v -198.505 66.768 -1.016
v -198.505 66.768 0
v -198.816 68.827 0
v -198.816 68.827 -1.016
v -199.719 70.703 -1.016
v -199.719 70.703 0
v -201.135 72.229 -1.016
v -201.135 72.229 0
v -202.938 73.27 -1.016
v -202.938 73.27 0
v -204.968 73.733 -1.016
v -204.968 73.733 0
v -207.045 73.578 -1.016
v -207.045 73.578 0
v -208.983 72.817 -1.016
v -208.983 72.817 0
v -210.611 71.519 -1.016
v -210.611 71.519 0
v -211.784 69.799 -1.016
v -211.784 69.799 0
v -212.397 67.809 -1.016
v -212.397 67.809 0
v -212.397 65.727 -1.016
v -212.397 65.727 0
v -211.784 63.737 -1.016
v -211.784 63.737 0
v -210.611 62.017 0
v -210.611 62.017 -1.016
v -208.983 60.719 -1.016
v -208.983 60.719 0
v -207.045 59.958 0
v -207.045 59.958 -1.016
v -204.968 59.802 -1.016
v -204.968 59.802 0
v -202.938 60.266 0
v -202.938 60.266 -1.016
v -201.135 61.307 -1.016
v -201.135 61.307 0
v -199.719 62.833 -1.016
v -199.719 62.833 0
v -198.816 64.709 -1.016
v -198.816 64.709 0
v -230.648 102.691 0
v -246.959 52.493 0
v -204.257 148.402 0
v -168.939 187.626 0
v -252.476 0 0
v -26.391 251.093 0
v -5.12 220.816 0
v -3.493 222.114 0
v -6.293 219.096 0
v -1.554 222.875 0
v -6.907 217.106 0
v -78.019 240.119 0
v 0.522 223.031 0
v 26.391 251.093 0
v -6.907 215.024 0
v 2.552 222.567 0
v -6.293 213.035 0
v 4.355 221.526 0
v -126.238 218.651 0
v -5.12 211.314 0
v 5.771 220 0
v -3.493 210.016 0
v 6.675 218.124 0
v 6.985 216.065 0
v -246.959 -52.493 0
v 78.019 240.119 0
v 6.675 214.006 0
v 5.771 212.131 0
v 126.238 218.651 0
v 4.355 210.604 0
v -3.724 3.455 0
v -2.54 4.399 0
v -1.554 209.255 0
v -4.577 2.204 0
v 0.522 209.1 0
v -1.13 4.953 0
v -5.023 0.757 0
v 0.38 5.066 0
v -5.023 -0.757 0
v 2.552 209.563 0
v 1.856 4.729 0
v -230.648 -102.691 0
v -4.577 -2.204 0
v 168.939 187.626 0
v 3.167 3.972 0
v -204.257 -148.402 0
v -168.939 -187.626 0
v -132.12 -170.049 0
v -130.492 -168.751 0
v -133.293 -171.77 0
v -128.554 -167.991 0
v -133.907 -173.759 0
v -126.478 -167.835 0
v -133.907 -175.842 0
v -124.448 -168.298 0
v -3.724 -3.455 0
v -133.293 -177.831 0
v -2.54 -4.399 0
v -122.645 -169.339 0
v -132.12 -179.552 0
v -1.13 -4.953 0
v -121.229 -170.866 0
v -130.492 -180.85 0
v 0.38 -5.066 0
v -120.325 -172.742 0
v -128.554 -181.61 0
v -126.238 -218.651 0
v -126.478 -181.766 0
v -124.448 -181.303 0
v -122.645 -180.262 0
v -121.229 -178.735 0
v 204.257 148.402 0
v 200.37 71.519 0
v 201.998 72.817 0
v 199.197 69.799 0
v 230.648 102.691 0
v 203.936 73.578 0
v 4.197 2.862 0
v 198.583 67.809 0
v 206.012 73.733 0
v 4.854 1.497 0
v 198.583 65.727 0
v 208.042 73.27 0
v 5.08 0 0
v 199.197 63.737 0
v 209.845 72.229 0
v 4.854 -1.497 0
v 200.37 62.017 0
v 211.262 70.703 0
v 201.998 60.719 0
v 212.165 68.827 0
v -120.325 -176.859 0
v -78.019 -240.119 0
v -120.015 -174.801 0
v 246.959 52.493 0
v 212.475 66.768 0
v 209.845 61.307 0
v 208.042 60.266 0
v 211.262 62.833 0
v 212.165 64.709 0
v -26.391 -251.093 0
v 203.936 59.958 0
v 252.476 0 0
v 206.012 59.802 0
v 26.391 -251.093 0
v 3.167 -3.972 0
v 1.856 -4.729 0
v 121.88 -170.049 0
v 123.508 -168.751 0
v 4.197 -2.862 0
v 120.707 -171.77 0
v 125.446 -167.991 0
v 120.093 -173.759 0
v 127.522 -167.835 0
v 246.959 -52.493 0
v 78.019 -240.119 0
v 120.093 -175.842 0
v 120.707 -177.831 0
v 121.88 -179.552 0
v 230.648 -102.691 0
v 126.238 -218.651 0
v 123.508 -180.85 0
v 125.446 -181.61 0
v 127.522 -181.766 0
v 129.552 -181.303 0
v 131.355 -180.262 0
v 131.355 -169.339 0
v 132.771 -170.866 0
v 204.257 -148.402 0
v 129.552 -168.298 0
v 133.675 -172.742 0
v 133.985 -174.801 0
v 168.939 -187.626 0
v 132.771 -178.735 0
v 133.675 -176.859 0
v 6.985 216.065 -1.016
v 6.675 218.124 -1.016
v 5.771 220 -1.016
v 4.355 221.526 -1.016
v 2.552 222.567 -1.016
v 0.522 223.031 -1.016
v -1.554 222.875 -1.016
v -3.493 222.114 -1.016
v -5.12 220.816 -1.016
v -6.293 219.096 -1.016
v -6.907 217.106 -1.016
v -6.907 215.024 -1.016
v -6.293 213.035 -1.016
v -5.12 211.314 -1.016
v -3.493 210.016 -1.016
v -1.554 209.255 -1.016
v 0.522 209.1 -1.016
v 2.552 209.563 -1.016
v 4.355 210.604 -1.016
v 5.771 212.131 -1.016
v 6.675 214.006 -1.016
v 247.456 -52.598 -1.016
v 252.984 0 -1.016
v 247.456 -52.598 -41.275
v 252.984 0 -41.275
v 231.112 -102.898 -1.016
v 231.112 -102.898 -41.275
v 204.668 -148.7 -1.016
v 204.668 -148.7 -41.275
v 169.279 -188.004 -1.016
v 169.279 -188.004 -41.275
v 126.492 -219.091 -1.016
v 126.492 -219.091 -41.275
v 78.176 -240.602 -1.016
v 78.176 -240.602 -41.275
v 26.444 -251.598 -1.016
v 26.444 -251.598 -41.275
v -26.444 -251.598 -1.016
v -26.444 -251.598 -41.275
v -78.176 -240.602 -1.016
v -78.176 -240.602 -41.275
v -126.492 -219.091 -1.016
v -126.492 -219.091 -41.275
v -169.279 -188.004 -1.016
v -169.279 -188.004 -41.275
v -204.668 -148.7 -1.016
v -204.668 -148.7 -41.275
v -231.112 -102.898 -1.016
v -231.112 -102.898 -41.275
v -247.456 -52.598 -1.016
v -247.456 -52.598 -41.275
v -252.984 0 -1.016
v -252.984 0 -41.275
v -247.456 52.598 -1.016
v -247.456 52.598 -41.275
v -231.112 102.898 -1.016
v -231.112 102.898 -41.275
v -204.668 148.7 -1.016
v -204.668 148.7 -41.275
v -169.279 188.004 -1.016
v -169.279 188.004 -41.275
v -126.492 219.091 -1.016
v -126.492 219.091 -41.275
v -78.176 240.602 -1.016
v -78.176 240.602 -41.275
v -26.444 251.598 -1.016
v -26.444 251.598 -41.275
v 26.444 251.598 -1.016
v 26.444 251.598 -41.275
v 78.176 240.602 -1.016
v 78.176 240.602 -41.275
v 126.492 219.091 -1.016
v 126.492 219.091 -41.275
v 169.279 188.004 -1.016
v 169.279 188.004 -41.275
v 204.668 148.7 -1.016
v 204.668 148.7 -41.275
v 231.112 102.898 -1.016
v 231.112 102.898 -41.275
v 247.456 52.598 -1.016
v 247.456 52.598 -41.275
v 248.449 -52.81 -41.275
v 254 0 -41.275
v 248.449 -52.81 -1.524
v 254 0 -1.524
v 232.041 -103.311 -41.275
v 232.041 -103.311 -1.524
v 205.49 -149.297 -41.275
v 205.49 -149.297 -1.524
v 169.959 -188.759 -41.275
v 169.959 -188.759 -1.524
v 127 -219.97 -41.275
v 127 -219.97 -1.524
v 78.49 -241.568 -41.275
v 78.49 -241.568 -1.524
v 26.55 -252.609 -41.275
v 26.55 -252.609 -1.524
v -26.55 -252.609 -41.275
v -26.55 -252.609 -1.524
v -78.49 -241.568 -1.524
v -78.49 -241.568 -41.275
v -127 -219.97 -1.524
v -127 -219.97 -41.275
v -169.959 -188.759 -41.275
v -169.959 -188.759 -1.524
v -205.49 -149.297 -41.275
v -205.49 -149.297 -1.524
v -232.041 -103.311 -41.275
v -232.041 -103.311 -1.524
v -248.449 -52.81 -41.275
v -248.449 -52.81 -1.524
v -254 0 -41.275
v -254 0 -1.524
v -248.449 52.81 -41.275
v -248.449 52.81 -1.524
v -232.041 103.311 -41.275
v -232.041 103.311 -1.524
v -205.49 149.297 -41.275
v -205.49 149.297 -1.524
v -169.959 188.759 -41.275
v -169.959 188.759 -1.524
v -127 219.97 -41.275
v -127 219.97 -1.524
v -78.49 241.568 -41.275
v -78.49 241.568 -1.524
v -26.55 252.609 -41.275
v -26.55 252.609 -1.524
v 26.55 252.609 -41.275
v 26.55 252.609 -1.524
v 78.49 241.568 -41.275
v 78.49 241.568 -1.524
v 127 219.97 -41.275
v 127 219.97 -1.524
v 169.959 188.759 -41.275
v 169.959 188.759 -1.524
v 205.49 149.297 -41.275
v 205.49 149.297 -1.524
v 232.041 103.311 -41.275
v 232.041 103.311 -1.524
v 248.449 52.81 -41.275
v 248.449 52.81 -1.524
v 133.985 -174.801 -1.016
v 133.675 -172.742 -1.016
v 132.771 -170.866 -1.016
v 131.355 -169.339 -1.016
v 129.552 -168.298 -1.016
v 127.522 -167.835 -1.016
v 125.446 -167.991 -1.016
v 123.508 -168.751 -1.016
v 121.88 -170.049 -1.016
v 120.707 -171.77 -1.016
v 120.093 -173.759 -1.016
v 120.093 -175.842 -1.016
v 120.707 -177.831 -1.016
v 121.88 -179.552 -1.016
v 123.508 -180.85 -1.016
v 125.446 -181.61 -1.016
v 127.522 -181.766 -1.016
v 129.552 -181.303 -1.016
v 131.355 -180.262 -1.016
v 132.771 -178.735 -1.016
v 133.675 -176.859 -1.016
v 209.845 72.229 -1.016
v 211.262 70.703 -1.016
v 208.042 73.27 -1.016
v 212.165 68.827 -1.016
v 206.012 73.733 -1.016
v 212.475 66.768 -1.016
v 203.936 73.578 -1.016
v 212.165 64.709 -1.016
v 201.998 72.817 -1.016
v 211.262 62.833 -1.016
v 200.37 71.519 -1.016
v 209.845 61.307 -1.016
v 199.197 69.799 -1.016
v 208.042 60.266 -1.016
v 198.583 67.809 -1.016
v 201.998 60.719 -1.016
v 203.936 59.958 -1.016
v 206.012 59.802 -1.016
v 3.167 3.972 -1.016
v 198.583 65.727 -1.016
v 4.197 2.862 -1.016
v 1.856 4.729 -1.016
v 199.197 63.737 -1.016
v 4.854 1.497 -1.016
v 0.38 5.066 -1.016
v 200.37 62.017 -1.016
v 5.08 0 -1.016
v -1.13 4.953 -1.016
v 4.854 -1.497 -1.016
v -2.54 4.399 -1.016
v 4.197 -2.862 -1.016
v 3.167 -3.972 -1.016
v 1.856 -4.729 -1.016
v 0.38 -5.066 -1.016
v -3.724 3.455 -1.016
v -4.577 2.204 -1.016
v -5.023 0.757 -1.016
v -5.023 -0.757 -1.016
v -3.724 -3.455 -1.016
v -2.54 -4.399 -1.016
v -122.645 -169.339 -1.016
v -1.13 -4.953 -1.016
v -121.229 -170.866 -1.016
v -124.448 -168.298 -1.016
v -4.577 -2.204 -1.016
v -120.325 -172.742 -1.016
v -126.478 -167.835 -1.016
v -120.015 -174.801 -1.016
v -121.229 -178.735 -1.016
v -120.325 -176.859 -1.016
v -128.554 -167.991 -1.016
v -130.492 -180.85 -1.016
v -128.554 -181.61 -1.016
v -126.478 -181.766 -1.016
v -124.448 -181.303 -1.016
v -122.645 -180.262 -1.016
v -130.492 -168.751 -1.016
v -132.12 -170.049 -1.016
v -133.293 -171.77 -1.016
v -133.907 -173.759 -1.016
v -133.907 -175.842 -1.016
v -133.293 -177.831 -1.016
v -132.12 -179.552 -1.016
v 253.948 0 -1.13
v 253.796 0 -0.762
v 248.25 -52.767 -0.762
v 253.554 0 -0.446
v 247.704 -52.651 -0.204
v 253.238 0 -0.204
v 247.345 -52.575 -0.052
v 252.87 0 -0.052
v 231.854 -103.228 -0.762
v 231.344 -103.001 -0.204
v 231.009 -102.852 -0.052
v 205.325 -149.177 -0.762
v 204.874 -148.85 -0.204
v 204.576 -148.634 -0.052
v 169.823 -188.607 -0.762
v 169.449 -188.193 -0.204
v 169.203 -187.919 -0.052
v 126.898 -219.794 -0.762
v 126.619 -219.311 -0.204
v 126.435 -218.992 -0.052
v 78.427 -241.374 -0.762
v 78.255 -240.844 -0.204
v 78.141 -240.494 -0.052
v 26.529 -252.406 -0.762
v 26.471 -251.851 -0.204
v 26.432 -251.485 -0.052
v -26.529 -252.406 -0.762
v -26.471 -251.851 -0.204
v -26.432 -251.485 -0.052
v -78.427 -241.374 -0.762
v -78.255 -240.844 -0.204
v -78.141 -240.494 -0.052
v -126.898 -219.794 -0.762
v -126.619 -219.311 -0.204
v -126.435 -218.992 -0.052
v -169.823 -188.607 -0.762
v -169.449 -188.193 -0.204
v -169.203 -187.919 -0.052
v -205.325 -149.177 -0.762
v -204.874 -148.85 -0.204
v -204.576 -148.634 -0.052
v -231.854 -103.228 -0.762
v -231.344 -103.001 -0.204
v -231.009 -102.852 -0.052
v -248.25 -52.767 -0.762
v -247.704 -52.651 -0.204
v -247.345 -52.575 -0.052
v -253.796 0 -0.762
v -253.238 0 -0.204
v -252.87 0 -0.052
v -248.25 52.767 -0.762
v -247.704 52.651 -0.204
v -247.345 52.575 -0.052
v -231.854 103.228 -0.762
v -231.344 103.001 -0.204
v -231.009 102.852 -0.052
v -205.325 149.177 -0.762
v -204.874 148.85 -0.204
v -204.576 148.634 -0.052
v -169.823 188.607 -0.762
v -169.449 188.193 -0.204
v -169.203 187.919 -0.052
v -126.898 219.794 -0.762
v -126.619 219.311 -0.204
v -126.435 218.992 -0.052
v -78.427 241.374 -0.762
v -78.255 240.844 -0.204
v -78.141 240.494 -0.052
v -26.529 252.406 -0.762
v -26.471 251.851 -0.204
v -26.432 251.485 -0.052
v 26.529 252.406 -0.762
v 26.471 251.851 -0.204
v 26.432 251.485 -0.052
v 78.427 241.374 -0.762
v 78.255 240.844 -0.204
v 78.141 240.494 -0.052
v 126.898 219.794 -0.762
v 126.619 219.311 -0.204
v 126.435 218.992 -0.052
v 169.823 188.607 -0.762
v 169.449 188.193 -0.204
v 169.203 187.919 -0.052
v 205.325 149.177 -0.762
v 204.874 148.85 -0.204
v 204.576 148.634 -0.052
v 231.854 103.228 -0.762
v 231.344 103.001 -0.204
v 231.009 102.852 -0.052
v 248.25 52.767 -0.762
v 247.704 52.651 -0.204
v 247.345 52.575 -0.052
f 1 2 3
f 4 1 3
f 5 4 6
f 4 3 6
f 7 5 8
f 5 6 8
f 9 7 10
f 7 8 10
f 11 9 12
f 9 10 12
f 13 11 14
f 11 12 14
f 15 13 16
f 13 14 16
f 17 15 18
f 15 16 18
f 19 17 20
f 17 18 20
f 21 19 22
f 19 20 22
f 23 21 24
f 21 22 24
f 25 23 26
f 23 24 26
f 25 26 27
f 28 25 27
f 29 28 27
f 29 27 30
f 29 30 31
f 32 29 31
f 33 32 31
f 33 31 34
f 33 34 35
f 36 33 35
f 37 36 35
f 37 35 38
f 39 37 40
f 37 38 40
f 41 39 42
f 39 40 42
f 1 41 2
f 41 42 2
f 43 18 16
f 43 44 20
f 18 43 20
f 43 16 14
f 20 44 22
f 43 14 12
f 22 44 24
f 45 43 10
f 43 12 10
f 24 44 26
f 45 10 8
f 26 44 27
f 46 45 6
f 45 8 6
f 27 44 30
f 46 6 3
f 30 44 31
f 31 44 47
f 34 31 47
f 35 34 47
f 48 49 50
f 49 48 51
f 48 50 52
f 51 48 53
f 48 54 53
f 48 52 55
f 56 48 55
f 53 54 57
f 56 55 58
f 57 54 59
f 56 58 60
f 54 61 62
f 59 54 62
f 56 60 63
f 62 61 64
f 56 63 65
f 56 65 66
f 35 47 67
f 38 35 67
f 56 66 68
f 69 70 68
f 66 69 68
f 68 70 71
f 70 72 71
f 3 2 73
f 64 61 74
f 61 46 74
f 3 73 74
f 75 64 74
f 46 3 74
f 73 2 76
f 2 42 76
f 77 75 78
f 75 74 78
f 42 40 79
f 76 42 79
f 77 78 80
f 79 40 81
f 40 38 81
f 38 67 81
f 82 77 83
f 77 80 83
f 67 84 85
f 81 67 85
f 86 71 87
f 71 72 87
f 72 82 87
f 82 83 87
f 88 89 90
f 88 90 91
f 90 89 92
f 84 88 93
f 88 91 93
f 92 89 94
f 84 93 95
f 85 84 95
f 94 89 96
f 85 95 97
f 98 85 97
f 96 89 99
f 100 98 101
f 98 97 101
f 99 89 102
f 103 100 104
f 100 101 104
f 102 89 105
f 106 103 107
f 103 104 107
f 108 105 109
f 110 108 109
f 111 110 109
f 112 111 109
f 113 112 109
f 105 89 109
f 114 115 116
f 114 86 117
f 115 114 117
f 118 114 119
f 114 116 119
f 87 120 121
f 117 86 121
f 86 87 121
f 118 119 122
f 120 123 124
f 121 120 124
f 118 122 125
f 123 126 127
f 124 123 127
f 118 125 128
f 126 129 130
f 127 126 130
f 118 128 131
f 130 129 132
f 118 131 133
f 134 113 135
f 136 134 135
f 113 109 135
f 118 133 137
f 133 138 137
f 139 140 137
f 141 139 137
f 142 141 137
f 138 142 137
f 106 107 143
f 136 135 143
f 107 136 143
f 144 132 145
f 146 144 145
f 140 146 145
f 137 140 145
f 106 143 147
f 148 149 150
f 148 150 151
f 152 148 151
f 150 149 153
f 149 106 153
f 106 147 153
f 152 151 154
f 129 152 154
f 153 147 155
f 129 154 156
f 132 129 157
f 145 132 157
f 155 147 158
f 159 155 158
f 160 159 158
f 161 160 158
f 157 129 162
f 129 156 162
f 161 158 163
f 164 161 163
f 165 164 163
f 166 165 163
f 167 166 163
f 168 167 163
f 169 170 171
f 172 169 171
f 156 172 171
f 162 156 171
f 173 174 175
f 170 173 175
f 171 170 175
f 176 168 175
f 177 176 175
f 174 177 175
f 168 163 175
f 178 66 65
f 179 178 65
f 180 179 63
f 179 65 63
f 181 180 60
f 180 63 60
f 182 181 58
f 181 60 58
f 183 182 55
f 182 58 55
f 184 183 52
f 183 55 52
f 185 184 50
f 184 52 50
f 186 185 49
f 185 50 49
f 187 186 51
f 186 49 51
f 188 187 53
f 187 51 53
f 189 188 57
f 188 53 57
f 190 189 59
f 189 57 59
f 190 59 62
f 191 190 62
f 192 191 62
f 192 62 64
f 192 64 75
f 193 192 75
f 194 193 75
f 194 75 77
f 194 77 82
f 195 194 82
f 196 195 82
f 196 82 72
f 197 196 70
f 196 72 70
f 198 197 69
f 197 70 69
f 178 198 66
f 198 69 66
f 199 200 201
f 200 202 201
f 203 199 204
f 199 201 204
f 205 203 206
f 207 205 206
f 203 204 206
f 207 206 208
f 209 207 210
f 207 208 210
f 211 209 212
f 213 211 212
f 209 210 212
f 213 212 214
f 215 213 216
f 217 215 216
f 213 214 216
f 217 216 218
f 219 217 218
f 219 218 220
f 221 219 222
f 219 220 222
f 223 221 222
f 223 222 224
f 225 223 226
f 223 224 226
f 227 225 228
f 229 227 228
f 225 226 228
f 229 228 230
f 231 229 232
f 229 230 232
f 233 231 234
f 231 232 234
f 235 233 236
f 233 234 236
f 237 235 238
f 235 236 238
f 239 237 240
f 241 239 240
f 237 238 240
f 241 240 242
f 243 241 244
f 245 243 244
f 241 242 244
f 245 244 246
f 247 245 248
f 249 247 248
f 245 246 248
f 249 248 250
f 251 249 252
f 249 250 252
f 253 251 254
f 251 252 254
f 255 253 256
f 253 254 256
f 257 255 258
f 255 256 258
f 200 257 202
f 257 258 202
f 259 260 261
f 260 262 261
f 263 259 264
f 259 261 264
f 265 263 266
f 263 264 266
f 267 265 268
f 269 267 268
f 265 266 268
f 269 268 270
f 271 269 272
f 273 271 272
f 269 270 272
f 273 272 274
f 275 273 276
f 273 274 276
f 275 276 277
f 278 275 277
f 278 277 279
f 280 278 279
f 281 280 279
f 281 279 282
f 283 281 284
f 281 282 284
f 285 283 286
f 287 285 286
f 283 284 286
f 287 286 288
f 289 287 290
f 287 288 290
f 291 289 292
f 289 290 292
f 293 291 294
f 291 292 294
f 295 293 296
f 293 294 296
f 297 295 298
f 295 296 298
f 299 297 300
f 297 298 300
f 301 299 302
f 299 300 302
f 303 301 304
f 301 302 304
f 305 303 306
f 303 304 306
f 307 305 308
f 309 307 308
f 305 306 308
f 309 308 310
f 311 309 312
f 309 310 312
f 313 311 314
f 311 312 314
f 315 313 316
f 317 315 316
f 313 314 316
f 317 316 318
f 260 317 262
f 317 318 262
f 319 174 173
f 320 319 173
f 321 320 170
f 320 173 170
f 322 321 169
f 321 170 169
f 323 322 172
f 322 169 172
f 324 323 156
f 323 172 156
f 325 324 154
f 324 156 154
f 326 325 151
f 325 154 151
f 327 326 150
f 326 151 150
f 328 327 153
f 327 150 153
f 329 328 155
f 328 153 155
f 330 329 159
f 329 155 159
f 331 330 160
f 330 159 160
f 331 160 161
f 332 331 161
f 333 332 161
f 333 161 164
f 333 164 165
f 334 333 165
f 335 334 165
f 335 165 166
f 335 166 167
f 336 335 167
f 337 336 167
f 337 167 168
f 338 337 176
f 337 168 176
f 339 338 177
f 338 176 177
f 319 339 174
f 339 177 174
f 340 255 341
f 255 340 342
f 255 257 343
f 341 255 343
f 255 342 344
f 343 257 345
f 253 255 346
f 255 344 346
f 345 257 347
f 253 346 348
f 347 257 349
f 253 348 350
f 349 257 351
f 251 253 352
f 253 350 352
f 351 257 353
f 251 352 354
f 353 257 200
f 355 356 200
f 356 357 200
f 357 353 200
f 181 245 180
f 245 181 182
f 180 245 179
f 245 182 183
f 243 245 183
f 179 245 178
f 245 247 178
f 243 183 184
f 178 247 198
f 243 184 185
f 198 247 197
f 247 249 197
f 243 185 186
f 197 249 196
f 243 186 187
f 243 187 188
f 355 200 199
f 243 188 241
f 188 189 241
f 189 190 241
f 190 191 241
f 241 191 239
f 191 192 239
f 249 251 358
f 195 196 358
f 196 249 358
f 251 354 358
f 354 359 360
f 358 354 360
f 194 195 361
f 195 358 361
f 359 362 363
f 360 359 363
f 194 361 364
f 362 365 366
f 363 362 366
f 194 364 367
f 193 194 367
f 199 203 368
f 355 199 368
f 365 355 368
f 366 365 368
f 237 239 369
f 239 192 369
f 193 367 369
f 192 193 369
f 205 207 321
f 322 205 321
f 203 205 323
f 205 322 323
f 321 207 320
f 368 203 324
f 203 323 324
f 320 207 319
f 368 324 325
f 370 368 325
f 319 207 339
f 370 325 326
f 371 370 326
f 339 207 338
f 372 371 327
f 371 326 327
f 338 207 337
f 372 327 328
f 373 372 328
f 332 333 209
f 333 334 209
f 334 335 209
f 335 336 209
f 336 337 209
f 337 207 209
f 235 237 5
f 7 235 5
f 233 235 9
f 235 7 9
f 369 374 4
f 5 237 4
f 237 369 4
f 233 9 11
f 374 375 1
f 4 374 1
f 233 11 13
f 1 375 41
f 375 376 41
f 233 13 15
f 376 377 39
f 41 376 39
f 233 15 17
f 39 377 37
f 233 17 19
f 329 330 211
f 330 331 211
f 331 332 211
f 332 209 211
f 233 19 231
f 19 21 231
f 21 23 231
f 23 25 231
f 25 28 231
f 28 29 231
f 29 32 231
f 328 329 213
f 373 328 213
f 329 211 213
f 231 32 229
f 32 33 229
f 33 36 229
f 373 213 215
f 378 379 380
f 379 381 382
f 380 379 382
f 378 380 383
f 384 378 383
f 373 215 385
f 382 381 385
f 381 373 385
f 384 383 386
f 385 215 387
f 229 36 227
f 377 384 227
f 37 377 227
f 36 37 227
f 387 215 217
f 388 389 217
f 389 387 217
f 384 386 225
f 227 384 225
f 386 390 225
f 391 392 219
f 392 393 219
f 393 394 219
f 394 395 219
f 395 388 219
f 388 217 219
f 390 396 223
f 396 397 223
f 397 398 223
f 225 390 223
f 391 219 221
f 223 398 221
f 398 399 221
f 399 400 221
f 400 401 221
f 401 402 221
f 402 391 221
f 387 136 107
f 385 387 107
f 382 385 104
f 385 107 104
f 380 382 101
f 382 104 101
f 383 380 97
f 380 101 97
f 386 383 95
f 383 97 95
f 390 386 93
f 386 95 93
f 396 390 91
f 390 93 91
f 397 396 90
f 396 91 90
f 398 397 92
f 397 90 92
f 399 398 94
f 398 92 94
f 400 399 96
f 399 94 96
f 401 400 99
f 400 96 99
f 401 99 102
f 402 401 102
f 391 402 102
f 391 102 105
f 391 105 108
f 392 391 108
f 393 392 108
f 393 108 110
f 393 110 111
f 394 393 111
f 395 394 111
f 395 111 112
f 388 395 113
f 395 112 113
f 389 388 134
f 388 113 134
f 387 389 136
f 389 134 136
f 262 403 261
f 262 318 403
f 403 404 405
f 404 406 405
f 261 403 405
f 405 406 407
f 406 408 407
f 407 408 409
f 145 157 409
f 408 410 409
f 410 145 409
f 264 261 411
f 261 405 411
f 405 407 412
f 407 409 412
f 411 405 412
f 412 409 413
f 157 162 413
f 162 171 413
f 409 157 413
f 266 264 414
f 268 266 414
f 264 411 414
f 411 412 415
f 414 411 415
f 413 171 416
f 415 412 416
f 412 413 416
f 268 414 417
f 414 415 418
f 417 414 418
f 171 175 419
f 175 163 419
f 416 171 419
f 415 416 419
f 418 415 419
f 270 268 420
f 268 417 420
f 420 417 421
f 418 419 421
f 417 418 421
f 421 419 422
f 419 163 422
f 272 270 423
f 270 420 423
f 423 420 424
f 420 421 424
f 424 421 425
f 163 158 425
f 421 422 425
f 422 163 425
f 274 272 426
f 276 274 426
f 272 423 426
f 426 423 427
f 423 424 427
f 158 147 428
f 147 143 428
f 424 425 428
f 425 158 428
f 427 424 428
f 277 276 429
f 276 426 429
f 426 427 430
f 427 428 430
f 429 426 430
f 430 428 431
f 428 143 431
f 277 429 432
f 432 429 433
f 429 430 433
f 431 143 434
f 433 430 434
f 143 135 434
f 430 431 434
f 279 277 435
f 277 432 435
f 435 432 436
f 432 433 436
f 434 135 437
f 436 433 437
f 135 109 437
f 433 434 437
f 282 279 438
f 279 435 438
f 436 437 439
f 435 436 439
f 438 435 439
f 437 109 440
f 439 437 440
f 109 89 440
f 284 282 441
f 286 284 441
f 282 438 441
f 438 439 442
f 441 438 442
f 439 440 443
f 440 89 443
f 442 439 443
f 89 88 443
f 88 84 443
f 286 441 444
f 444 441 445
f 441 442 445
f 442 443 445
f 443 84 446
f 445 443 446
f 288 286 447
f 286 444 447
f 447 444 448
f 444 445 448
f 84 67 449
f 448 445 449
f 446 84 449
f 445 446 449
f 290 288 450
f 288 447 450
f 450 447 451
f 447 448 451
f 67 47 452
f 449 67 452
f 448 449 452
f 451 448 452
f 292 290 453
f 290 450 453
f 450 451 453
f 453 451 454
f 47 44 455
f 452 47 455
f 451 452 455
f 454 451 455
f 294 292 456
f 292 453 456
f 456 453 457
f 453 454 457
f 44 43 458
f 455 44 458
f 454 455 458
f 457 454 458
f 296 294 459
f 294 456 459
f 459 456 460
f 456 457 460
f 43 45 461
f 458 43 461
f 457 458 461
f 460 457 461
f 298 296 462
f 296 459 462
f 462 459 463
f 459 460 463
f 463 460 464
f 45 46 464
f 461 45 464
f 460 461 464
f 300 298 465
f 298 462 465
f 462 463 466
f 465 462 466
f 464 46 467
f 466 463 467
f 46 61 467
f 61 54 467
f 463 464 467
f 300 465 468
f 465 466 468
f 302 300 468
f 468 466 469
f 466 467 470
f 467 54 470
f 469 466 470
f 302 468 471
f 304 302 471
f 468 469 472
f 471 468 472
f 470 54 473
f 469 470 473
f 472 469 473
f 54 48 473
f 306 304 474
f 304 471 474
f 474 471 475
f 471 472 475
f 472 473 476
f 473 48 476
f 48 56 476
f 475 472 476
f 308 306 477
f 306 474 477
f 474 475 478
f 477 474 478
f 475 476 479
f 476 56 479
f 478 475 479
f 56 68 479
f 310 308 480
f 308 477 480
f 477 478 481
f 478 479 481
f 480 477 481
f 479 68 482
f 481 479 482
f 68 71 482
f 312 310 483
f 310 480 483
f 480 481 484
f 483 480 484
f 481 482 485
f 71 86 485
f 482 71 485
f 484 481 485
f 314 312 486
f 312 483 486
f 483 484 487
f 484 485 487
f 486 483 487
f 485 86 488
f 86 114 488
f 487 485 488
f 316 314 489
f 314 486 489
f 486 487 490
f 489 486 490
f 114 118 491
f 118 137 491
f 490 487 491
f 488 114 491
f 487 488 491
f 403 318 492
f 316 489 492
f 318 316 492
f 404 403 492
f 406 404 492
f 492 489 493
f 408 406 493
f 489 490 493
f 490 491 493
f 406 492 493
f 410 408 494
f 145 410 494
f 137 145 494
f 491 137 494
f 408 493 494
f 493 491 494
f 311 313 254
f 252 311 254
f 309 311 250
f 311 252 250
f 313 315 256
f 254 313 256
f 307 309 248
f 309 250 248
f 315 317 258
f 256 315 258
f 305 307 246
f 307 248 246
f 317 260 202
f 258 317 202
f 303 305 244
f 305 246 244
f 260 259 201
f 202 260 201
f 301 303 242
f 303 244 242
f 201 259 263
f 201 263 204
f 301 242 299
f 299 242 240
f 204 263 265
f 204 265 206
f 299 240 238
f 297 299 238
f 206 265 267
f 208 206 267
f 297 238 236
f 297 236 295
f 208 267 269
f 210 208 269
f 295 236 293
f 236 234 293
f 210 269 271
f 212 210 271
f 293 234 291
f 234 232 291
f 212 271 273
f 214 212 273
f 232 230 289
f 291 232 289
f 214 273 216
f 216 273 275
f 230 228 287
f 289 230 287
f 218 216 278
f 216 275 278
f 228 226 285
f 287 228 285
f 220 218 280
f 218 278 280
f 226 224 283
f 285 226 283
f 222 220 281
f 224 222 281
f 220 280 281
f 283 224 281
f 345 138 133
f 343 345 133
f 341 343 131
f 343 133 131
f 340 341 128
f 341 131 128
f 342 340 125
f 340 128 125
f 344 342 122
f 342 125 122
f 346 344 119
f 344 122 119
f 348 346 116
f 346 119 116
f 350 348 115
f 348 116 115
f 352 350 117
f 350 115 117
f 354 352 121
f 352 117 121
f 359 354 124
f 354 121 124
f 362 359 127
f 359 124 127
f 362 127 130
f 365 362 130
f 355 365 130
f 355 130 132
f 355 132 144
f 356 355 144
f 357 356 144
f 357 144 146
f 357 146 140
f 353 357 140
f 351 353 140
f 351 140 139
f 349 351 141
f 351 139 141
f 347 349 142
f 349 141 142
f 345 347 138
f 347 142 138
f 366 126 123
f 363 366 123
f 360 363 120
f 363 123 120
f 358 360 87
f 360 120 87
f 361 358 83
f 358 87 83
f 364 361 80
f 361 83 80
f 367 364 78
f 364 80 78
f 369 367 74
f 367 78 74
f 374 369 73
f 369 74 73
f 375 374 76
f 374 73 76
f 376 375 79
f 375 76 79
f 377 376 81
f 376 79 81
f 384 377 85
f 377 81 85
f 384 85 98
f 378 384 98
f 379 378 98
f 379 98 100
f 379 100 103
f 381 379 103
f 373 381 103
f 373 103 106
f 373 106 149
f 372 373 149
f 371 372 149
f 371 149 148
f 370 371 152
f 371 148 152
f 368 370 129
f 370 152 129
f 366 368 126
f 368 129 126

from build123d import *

# Parameters (mm, degrees)
F3_R     = 6.985
F3_R_2   = 5.08
F4_DEPTH = 1.016


with BuildPart() as f2:
    # F1 (on Front) → F2 (revolve)
    with BuildSketch(Plane.XZ):
        with BuildLine():
            Line((252.476, 0), (0, 0))
            Line((0, 0), (0, -1.016))
            Line((0, -1.016), (252.984, -1.016))
            Line((252.984, -1.016), (252.984, -41.275))
            Line((252.984, -41.275), (254, -41.275))
            Line((254, -41.275), (254, -1.524))
            ThreePointArc((254, -1.524), (253.553631, -0.446369), (252.476, 0))
        make_face()
    revolve(axis=Axis((0, 0, -44.069175), (0, 0, -1)))

    # F3 (on Top) → F4 (cut, through all)
    with BuildSketch(Plane.XY):
        with Locations((205.490317, 66.767851)):
            Circle(F3_R)
        with Locations((0, 216.065305)):
            Circle(F3_R)
        with Locations((-205.490317, 66.767851)):
            Circle(F3_R)
        with Locations((-127, -174.800504)):
            Circle(F3_R)
        with Locations((127, -174.800504)):
            Circle(F3_R)
        Circle(F3_R_2)
    extrude(amount=-F4_DEPTH, mode=Mode.SUBTRACT)


solid = f2.part
